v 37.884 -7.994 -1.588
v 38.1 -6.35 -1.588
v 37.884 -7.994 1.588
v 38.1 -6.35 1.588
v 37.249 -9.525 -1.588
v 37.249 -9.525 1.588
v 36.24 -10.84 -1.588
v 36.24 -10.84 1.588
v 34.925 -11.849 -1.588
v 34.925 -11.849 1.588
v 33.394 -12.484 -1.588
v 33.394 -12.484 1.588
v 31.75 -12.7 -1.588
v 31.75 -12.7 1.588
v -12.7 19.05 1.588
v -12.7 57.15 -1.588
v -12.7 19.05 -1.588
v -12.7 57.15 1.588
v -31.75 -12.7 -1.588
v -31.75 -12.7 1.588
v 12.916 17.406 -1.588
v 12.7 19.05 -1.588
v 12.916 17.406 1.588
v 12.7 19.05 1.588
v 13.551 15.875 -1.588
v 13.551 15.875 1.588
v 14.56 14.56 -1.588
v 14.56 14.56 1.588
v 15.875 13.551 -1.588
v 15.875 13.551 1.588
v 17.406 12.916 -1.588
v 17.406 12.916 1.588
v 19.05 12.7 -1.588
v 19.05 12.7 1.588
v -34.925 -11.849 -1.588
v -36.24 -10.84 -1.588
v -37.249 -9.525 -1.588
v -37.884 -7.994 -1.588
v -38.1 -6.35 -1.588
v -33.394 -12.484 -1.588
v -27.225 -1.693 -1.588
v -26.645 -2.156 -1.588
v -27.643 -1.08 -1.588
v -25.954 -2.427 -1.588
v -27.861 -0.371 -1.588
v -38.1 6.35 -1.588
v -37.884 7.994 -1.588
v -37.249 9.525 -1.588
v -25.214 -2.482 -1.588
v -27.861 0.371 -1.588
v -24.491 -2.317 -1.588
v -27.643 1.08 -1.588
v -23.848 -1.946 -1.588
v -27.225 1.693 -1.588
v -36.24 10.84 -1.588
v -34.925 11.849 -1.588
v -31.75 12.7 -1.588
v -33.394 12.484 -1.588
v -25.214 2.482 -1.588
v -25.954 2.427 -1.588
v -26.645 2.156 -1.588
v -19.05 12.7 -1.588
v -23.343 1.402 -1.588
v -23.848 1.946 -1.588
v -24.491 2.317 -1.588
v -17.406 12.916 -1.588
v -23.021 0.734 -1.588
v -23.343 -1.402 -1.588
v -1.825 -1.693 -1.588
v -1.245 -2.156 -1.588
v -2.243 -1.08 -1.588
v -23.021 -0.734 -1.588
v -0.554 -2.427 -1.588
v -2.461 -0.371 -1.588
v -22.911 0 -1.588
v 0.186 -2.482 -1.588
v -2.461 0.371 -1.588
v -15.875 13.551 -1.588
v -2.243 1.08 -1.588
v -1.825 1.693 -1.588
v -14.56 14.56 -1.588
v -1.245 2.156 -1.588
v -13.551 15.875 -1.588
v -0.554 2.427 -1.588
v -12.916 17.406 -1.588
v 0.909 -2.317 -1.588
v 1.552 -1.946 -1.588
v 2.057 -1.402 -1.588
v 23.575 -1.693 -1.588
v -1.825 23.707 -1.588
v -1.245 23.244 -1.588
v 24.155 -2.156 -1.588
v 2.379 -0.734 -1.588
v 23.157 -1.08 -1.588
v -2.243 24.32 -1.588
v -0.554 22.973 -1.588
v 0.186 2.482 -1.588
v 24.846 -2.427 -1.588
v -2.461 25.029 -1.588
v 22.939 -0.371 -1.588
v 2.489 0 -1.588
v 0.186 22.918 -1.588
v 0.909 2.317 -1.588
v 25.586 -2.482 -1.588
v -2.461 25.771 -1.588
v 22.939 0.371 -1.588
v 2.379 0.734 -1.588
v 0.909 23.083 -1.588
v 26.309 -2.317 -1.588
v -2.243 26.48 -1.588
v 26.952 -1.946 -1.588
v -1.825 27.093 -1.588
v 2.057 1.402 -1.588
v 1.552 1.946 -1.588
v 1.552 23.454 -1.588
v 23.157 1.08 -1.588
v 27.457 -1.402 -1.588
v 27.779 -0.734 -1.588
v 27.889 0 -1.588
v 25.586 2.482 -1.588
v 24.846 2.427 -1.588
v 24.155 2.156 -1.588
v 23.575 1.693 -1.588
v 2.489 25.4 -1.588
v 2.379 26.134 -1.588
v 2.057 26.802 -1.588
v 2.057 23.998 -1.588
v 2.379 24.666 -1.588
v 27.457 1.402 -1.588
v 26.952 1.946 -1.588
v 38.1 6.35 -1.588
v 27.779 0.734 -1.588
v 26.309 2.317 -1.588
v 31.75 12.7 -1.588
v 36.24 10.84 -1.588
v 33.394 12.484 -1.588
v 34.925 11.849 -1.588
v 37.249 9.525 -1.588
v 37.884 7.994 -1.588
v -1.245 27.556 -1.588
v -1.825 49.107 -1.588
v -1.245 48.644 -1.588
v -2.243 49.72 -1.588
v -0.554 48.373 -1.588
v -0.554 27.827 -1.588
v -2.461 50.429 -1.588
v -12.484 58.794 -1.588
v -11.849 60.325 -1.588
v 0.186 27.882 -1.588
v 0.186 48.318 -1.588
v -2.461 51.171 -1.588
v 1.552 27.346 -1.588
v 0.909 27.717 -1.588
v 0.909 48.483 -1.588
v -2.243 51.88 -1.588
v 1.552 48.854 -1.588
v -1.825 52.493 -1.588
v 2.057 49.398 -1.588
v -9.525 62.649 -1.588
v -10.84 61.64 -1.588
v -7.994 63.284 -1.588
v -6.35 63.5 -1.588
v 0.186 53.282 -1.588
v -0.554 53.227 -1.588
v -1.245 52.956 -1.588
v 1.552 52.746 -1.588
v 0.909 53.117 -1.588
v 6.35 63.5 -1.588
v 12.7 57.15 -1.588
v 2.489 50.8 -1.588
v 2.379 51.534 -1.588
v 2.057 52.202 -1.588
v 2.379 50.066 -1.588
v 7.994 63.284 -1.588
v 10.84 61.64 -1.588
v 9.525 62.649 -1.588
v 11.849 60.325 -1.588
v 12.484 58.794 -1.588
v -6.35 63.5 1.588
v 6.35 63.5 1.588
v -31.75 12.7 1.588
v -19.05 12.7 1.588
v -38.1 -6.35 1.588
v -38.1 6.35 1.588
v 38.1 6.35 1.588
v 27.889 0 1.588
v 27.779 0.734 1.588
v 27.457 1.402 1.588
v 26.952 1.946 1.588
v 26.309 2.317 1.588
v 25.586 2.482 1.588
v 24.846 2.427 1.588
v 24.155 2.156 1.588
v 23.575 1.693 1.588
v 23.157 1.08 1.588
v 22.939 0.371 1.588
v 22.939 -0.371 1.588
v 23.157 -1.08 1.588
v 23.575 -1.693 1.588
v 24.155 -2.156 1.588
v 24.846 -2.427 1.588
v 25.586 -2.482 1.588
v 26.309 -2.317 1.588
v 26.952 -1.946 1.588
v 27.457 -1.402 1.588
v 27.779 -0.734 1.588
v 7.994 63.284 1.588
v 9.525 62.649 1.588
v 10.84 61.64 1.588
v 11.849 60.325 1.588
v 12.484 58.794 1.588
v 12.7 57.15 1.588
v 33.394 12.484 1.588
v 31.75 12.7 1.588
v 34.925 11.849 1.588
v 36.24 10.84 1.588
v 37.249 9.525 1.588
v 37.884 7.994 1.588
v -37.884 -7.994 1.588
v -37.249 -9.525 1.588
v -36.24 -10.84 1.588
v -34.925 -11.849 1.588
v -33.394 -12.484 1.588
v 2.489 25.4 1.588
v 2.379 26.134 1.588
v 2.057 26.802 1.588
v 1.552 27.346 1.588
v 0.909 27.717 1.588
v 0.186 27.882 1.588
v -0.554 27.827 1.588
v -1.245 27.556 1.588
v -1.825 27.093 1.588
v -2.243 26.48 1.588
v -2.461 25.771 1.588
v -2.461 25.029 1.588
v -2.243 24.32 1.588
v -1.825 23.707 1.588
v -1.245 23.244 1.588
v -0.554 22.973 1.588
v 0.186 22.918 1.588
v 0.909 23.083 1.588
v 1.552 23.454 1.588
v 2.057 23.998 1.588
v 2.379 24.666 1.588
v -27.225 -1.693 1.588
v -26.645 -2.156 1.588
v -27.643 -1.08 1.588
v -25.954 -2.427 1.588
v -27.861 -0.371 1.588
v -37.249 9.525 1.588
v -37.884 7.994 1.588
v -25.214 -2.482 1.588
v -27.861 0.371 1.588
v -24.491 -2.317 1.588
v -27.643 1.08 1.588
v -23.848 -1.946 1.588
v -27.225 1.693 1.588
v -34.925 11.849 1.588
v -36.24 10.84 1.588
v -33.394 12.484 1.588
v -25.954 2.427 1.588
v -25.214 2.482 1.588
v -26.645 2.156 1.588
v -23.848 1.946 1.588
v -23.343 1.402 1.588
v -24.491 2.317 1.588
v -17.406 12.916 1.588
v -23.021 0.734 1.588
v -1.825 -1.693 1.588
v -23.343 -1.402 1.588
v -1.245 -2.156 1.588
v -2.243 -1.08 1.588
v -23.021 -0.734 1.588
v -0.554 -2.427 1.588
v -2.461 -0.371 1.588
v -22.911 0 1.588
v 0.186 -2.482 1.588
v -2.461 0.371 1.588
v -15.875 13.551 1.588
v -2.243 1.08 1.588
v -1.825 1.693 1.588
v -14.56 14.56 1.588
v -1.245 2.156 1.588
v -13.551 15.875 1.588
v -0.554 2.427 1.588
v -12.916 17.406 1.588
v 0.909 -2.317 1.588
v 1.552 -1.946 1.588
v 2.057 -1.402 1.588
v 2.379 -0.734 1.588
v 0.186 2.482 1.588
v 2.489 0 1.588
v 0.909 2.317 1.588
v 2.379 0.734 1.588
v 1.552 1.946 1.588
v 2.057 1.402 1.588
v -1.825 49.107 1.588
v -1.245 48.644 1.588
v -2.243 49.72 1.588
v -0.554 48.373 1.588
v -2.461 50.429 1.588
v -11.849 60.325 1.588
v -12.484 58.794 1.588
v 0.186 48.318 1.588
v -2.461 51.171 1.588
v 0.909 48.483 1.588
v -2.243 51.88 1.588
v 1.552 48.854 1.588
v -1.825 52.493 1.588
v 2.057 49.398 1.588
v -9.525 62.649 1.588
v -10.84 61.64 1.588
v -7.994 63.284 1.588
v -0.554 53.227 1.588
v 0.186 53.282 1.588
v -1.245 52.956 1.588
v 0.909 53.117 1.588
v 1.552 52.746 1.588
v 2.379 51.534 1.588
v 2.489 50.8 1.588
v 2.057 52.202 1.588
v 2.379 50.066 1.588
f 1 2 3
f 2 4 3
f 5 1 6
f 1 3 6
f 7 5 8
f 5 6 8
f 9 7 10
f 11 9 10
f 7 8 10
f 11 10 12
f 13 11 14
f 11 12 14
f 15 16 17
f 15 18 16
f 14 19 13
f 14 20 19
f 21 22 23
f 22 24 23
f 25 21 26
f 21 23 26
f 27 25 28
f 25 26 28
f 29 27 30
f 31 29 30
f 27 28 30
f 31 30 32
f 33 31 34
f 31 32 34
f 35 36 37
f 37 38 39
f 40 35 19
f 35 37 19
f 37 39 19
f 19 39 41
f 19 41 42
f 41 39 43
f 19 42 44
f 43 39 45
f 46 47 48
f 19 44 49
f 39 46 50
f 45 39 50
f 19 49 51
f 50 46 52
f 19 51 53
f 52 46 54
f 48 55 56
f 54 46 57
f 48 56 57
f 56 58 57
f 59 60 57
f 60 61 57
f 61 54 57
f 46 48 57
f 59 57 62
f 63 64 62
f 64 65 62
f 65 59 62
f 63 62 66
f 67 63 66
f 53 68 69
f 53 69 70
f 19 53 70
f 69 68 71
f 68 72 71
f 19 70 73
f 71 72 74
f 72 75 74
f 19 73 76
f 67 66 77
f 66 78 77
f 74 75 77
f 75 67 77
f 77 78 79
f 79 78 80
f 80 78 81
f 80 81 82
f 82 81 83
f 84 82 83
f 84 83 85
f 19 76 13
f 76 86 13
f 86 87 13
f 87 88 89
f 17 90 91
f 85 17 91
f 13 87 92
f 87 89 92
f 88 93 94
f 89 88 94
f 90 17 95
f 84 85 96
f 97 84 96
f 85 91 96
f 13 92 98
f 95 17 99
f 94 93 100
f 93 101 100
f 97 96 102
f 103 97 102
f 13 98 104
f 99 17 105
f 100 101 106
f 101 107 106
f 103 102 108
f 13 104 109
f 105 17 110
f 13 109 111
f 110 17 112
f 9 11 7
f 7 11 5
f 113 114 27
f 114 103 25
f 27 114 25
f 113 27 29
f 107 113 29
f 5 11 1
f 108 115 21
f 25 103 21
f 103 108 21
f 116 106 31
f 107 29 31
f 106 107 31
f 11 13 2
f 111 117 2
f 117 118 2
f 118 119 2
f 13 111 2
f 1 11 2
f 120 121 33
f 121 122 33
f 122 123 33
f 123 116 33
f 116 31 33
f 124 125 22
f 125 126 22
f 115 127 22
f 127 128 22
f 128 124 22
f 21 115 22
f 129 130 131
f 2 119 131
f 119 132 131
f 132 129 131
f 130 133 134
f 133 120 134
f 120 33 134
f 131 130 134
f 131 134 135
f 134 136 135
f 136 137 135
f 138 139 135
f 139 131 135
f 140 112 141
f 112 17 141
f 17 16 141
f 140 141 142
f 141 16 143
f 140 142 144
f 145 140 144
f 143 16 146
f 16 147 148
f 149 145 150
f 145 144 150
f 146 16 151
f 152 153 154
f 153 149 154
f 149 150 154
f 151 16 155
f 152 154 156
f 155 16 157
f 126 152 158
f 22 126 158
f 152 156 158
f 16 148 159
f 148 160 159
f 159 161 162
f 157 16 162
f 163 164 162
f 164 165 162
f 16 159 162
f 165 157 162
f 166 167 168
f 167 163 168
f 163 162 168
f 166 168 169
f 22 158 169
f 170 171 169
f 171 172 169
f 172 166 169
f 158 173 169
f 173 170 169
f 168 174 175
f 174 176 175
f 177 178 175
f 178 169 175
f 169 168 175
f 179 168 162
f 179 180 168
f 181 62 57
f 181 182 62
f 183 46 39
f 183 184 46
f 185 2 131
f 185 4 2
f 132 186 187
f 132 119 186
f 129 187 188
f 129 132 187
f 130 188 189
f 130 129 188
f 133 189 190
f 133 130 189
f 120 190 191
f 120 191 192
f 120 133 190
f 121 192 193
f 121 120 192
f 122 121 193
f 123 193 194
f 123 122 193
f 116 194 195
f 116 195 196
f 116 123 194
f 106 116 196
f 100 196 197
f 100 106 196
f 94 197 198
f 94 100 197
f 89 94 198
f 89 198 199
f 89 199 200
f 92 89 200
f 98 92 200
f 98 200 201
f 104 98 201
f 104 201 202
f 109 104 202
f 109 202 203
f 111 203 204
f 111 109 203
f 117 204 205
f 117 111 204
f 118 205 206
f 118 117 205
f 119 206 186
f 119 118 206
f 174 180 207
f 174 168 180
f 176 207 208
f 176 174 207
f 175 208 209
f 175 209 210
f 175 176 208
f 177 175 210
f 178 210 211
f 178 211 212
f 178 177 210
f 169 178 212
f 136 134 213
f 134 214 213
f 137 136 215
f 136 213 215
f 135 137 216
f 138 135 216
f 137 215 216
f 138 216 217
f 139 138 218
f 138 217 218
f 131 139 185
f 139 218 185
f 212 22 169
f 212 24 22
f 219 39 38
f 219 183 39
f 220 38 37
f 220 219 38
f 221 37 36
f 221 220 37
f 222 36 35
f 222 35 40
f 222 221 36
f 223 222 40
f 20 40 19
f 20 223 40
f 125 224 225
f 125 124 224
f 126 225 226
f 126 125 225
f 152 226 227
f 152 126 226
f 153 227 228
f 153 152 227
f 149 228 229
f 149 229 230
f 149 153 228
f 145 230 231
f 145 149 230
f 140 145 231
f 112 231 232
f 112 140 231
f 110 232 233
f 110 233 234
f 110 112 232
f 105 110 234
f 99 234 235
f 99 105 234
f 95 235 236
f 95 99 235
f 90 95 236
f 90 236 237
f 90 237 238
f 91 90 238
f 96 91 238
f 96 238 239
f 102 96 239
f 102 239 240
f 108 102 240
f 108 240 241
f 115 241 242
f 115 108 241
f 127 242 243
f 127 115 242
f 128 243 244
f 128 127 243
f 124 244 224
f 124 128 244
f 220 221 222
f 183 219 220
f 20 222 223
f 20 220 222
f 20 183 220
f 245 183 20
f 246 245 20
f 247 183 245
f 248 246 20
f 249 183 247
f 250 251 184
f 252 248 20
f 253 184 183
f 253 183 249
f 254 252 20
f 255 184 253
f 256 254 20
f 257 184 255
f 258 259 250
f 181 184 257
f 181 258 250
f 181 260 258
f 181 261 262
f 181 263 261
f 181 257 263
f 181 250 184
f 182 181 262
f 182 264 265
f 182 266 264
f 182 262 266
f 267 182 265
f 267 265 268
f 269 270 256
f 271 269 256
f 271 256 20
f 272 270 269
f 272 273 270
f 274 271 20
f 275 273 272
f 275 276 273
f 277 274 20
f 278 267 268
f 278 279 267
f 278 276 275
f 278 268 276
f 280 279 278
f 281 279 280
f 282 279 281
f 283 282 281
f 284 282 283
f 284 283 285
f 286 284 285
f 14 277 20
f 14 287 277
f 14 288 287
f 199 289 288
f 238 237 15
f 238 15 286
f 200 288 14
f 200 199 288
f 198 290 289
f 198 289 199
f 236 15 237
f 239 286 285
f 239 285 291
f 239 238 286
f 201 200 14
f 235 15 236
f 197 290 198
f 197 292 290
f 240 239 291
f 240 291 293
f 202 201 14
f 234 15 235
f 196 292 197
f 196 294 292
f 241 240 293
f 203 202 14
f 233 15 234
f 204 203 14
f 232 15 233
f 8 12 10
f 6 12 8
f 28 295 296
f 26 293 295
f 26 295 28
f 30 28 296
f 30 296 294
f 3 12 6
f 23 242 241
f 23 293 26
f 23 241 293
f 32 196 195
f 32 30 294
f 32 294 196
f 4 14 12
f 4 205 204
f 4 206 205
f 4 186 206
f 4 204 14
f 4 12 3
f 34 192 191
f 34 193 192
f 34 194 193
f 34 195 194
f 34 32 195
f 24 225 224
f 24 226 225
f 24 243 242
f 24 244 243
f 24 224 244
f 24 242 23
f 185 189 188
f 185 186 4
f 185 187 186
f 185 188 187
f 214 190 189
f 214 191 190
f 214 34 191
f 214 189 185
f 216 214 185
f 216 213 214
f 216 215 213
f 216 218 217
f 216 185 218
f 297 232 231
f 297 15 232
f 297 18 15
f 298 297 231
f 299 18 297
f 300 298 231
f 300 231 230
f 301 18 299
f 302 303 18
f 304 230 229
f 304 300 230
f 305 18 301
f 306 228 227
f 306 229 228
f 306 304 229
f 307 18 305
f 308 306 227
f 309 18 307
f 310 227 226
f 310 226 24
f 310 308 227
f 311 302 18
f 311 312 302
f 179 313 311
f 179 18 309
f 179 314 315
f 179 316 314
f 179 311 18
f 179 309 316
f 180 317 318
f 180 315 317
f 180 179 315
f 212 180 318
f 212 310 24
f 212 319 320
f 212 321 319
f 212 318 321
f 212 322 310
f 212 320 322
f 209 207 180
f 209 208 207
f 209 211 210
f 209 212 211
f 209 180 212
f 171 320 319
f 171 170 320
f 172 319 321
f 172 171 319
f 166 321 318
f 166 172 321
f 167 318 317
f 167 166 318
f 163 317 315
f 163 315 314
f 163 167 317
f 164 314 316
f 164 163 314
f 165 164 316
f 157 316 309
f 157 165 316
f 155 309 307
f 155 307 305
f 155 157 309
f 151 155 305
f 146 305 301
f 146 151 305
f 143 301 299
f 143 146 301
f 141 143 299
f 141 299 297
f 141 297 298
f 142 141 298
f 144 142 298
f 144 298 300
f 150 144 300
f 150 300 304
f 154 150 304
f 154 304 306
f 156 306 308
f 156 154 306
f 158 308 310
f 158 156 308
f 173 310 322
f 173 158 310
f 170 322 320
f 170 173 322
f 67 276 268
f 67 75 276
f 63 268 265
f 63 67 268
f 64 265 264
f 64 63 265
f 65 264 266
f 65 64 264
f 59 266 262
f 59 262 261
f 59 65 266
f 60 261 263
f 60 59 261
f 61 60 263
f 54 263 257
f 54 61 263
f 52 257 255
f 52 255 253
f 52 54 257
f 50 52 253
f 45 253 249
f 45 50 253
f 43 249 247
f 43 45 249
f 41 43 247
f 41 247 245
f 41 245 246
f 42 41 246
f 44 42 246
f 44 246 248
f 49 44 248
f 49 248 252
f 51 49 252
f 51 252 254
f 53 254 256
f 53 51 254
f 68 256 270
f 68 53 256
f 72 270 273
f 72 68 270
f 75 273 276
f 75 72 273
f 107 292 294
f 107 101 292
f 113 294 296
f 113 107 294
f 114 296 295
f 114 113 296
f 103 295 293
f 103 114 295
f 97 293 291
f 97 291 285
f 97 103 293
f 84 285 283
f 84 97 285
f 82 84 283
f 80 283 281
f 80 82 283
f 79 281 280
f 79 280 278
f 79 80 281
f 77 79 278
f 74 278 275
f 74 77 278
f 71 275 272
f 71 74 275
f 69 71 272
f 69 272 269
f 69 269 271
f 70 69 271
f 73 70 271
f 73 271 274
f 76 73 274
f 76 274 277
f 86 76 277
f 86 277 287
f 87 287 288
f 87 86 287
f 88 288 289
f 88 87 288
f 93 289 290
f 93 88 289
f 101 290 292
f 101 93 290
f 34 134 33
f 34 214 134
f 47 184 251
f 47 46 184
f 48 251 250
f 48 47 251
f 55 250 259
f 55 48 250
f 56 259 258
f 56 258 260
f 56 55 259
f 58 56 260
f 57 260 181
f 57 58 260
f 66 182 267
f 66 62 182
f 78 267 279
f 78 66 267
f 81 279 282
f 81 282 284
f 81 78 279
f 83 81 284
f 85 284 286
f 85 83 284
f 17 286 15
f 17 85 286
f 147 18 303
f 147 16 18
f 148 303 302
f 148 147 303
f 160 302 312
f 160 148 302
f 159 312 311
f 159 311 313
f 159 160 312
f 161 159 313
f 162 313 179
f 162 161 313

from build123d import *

# Parameters (mm, degrees)
F0_R     = 2.4892
F1_DEPTH = 1.5875
F2_R     = 6.35


with BuildPart() as f1:
    # F0 (on Top) → F1 (new body, symmetric)
    with BuildSketch(Plane.XY):
        Polygon((-38.1, 12.7), (-38.1, -12.7), (38.1, -12.7), (38.1, 12.7), (12.7, 12.7), (12.7, 63.5), (-12.7, 63.5), (-12.7, 12.7), align=None)
        with Locations((-25.4, 0)):
            Circle(F0_R, mode=Mode.SUBTRACT)
        Circle(F0_R, mode=Mode.SUBTRACT)
        with Locations((25.4, 0)):
            Circle(F0_R, mode=Mode.SUBTRACT)
        with Locations((0, 25.4)):
            Circle(F0_R, mode=Mode.SUBTRACT)
        with Locations((0, 50.8)):
            Circle(F0_R, mode=Mode.SUBTRACT)
    extrude(amount=F1_DEPTH, both=True)

    # F2
    f2_edges = [f1.edges().sort_by_distance(p)[0] for p in [
        (-12.7, 12.7, 0),
        (-12.7, 63.5, 0),
        (12.7, 63.5, 0),
        (12.7, 12.7, 0),
        (38.1, 12.7, 0),
        (38.1, -12.7, 0),
        (-38.1, -12.7, 0),
        (-38.1, 12.7, 0),
    ]]
    fillet(f2_edges, radius=F2_R)


solid = f1.part
